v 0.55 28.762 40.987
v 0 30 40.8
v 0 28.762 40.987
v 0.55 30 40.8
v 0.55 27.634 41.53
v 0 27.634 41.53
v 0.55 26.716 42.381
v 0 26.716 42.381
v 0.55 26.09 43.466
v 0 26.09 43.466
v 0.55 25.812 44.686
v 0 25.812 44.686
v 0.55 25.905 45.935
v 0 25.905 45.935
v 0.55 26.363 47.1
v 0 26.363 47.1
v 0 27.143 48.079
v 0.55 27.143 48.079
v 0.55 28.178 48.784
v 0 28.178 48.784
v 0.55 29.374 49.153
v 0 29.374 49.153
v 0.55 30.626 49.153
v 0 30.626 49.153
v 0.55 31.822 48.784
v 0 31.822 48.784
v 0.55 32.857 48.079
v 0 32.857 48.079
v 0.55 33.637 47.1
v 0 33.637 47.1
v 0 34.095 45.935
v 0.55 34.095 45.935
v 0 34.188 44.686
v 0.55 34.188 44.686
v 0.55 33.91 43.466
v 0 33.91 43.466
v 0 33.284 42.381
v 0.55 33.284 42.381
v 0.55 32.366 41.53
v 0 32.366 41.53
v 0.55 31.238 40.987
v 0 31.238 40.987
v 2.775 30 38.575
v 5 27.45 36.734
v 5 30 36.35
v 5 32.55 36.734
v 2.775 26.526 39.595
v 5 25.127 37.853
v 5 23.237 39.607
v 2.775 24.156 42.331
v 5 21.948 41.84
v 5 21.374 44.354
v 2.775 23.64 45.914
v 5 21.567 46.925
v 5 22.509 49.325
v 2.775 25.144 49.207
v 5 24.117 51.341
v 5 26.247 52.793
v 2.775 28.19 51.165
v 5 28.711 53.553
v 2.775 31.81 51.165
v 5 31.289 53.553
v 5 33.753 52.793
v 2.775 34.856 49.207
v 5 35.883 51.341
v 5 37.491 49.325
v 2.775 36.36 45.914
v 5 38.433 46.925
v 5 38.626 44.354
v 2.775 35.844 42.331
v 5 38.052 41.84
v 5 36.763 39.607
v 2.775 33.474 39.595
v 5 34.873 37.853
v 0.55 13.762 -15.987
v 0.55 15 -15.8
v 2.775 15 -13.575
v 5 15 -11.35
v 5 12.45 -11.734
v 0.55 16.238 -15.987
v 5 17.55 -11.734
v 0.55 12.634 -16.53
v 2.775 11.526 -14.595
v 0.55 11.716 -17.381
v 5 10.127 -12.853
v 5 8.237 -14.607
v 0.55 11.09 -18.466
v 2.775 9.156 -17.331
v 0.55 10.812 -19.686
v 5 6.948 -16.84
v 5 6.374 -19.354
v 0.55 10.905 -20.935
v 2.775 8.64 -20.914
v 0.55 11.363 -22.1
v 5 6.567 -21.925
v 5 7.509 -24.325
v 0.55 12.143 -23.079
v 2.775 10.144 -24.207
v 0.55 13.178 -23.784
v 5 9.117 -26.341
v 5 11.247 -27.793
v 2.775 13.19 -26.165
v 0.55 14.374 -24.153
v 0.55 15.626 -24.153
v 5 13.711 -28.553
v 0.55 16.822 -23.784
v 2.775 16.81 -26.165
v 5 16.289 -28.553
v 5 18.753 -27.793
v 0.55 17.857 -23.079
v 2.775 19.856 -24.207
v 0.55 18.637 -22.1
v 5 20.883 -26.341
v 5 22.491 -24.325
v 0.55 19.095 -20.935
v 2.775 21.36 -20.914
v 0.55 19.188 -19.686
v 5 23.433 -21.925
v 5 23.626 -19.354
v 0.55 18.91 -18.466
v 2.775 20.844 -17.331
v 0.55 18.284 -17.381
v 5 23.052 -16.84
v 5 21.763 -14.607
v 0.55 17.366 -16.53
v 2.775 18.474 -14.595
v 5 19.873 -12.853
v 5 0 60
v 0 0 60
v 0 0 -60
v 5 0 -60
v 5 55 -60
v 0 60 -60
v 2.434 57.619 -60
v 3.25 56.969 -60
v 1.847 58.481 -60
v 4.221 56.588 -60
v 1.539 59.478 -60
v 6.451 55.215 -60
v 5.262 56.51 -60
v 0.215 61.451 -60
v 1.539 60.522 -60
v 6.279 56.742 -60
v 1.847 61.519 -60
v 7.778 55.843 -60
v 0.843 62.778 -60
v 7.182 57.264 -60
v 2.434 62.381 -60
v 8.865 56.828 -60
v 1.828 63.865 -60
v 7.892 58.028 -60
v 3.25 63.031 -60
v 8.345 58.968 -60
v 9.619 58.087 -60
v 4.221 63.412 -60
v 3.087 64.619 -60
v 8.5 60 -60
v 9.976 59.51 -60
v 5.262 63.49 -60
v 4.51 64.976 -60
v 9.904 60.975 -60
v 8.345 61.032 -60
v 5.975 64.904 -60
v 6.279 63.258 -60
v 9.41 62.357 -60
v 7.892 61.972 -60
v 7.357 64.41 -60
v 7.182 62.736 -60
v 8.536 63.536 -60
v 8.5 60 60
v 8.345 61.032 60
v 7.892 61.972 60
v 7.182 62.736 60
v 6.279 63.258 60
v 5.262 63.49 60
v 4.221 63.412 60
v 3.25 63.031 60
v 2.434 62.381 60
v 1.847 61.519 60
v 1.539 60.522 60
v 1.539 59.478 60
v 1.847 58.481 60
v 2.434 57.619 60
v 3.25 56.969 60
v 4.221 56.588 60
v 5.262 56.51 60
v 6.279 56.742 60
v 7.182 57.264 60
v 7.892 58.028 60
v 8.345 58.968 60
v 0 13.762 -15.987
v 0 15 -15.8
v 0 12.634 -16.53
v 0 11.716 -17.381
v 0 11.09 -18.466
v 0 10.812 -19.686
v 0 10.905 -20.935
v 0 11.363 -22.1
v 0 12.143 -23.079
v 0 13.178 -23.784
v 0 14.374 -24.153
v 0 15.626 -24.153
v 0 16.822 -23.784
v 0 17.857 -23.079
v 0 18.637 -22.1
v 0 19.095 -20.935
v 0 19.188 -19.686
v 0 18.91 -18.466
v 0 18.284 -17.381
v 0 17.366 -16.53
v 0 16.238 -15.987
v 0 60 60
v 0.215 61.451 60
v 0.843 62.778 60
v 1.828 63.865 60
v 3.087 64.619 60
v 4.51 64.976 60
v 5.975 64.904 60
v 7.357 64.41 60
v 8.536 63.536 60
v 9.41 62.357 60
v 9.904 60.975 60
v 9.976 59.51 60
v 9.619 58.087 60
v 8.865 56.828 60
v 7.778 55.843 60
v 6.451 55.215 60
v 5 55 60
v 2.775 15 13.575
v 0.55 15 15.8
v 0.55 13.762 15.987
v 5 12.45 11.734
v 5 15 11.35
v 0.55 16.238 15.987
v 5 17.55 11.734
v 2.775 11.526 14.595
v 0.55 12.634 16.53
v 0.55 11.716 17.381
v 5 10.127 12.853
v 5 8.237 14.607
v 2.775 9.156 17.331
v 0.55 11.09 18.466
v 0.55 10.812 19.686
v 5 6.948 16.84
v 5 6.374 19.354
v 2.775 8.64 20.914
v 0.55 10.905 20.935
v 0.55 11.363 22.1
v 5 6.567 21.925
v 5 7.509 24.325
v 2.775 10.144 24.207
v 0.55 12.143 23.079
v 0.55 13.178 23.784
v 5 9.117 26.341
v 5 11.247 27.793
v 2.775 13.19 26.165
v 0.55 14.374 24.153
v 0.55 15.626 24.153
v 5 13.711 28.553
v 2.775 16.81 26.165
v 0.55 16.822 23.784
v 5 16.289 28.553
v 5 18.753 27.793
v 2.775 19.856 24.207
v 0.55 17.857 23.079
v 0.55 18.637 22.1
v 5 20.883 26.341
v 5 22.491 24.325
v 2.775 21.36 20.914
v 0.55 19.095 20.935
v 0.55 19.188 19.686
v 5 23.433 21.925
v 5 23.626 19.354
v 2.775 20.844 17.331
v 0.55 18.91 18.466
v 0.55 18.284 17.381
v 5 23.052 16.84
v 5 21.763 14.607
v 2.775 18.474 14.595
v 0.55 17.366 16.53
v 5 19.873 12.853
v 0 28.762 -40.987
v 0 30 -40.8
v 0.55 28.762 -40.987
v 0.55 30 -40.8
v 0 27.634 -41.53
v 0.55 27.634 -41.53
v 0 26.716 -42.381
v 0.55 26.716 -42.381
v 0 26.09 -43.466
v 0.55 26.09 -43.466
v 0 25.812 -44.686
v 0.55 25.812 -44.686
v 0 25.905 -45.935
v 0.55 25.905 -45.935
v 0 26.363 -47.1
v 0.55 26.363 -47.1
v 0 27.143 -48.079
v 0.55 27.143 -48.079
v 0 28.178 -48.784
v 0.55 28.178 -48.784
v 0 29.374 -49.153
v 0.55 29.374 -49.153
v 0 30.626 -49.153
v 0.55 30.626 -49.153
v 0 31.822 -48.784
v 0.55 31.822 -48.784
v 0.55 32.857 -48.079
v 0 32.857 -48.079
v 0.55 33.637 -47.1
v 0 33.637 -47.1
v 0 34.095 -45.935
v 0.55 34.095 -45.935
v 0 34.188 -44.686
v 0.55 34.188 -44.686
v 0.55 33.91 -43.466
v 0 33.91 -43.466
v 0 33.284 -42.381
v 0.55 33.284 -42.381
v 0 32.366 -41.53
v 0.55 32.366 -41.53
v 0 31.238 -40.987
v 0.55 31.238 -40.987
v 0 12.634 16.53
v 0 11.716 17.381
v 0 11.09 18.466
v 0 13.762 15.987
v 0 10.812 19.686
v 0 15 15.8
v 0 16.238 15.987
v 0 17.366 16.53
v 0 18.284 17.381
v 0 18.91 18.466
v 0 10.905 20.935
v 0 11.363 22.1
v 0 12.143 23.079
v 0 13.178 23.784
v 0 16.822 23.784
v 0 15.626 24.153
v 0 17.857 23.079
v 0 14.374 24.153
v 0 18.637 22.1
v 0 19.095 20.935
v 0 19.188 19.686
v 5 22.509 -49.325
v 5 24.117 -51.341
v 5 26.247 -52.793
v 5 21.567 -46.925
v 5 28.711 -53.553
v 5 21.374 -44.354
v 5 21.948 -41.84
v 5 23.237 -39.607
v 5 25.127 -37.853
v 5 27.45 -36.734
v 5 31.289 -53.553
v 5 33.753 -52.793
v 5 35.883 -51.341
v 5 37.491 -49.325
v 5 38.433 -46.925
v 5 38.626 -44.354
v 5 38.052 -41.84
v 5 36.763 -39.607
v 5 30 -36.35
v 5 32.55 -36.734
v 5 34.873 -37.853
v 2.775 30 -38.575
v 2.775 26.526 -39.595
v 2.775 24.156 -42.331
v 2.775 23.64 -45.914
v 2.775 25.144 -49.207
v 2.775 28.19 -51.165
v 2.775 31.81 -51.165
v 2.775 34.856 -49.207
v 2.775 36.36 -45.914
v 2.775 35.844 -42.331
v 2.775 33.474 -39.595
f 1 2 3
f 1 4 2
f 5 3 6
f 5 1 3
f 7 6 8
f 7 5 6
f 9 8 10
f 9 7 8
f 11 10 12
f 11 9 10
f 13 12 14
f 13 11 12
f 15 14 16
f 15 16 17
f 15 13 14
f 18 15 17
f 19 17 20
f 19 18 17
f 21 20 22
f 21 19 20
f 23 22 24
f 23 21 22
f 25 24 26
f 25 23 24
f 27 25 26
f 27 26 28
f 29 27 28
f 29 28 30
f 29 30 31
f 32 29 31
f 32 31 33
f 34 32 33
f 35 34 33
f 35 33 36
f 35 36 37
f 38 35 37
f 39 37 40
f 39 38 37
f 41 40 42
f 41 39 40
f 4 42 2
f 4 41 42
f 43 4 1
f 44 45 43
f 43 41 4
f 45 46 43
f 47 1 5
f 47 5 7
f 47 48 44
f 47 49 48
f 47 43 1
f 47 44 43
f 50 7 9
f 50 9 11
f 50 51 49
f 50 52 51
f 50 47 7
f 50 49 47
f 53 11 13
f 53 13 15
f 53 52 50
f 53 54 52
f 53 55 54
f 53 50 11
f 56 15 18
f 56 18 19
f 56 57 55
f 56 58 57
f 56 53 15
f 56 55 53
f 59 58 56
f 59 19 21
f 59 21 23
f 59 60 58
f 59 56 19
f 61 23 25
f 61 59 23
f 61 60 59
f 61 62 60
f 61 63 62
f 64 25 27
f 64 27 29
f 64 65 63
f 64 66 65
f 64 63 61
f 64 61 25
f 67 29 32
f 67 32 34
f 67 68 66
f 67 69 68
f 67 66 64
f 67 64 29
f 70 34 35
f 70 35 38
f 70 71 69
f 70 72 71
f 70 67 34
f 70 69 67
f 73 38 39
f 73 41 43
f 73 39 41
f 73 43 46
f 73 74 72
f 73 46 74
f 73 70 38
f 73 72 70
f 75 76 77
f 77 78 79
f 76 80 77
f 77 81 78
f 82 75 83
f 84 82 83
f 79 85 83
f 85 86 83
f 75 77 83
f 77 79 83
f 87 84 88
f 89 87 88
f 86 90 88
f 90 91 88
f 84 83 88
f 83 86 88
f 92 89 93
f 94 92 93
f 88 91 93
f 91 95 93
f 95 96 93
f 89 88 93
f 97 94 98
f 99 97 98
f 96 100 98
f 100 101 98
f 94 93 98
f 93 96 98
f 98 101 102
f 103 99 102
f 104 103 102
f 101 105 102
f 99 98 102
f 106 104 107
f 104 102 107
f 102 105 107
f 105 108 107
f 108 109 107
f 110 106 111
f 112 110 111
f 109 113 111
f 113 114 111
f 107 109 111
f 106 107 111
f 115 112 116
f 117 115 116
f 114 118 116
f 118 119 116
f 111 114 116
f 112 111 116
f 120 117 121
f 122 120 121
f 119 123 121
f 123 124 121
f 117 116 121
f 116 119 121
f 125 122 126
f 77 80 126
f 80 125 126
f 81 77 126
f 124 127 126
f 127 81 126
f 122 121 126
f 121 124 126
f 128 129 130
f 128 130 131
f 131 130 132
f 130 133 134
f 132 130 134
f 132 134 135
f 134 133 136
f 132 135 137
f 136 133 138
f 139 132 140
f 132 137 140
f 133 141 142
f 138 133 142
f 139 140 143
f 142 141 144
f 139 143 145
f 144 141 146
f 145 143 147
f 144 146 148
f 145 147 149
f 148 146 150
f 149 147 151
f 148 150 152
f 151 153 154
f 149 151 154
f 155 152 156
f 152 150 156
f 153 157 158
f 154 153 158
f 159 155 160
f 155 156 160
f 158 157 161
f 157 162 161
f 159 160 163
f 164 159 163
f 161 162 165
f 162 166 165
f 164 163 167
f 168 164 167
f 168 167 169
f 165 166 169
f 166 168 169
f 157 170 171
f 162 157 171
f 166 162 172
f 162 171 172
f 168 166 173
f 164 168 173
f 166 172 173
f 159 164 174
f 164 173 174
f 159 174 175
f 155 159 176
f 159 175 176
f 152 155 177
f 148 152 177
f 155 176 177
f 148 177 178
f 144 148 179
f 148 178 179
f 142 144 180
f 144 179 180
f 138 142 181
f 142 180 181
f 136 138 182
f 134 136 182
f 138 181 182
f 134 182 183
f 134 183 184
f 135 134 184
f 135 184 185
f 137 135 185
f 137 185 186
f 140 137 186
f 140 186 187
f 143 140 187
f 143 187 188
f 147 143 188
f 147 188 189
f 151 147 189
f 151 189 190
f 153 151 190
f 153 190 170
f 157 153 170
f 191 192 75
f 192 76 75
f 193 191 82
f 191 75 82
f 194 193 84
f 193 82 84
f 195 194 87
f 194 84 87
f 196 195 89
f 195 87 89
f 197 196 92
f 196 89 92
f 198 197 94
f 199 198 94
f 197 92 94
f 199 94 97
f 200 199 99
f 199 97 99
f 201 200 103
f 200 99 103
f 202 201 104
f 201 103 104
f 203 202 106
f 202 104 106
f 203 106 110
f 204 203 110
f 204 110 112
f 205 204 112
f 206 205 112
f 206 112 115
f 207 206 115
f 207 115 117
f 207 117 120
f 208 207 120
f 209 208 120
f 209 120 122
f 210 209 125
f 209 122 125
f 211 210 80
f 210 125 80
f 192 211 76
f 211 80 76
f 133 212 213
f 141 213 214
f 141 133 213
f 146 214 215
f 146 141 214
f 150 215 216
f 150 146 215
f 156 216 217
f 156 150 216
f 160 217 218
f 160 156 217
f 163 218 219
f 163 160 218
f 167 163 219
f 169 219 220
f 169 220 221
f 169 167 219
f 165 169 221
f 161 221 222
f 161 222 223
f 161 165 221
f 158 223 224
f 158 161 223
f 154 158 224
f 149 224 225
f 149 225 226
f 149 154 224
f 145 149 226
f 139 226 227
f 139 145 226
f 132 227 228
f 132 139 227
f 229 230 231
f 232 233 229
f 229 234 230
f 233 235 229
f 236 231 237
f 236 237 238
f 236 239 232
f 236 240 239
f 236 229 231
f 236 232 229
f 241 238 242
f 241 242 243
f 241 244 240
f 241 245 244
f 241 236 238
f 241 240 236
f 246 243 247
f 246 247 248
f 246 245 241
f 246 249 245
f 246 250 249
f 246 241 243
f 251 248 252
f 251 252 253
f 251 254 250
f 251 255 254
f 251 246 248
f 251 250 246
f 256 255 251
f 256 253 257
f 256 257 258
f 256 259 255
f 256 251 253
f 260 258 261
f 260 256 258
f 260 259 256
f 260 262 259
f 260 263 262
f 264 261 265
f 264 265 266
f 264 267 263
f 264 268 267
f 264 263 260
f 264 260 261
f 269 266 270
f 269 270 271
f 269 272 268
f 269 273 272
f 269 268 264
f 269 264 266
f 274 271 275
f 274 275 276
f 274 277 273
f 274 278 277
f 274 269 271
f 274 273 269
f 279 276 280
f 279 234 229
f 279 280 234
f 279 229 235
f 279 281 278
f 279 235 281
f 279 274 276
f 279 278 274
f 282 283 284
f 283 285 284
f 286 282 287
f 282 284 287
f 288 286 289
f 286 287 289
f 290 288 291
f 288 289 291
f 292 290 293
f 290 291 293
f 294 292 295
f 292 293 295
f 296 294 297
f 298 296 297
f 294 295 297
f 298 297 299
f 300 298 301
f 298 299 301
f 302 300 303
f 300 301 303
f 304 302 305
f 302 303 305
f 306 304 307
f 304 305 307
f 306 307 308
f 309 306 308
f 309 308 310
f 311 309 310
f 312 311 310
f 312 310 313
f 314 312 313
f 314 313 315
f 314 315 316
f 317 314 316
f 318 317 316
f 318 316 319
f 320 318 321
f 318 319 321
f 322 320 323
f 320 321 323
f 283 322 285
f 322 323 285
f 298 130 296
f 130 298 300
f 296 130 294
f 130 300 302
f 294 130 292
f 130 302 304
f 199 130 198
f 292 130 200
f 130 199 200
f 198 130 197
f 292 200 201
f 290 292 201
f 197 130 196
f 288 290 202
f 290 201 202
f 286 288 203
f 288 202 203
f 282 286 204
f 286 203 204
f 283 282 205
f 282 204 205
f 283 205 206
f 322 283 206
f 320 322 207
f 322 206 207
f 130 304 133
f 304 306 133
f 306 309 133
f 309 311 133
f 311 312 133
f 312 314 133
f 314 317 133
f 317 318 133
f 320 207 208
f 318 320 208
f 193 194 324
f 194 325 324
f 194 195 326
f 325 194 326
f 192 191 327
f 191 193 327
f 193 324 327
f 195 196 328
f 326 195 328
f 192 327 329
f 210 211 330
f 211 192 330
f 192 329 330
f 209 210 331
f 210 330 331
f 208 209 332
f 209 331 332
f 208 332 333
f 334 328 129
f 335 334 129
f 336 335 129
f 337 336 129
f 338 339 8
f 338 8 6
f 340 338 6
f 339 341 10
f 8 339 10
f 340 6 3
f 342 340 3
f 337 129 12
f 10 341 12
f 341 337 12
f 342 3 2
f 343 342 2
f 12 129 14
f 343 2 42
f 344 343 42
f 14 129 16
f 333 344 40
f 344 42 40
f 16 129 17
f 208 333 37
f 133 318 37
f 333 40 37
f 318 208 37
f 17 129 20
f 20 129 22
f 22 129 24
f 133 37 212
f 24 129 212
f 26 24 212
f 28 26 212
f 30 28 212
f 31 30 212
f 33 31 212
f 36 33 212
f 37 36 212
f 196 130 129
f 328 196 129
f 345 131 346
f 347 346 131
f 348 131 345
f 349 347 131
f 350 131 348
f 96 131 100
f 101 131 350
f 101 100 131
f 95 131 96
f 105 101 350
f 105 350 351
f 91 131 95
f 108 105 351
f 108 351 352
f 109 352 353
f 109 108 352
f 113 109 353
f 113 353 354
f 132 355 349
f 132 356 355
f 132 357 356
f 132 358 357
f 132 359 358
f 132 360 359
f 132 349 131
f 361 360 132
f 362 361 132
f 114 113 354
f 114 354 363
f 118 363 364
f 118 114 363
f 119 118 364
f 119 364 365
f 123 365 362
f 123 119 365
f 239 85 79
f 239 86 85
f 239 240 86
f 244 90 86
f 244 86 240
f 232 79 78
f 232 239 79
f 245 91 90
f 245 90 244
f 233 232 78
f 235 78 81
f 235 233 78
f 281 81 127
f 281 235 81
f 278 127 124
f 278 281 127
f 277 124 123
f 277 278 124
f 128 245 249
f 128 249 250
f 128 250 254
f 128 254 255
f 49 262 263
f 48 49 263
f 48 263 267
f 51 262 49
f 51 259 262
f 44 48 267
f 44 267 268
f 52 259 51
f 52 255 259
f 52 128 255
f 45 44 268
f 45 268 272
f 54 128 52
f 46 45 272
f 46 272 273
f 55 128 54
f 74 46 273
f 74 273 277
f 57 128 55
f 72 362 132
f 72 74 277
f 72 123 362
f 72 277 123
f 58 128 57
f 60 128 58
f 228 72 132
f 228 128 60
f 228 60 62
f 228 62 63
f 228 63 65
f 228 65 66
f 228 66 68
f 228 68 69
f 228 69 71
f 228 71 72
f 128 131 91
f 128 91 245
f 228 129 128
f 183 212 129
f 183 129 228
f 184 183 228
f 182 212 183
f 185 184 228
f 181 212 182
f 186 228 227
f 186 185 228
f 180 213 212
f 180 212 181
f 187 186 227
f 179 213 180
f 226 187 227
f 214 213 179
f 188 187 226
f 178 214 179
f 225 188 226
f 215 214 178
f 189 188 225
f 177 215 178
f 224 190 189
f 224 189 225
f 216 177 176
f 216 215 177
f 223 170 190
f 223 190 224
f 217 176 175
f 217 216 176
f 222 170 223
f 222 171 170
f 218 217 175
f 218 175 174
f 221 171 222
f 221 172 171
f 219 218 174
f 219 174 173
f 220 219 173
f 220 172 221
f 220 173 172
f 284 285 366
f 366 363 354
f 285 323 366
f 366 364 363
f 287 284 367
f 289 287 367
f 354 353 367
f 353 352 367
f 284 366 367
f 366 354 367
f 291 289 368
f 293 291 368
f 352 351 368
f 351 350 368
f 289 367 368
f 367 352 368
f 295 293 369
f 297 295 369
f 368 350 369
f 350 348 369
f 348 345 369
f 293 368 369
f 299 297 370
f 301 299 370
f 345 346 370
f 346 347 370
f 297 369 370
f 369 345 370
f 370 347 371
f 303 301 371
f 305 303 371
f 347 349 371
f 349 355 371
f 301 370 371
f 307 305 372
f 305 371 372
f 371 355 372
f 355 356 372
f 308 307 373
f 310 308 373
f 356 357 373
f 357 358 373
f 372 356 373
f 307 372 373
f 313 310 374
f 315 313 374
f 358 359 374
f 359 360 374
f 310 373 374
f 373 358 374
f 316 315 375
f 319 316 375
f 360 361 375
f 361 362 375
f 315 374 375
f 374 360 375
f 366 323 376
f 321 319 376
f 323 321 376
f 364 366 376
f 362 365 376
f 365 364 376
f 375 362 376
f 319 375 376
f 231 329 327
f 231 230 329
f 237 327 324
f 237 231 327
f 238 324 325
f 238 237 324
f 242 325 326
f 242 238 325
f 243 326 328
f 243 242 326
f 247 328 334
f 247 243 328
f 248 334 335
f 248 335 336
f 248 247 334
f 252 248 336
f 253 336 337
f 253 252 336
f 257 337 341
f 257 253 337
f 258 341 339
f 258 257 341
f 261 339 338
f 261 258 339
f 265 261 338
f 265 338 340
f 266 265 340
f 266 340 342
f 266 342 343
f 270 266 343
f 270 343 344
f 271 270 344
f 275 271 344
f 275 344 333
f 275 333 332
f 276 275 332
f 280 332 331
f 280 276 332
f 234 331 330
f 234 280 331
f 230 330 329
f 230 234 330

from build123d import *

# Parameters (mm, degrees)
SKETCH2_W                                      = 5
SKETCH2_H                                      = 60
EXTRUDE_THIN1_DEPTH                            = 60
SKETCH3_R                                      = 5
SKETCH4_R                                      = 3.5
CUT_EXTRUDE1_DEPTH                             = 137.839321834
CSK_FOR_M8_FLAT_HEAD_MACHINE_SCREW1_AT_2_COUNT = 2
CSK_FOR_M8_FLAT_HEAD_MACHINE_SCREW1_AT_2_PITCH = 29.154759474


with BuildPart() as part:
    # Sketch2 → Extrude-Thin1 (new, symmetric)
    with BuildSketch(Plane.XY):
        with Locations((2.5, 30)):
            Rectangle(SKETCH2_W, SKETCH2_H)
    extrude(amount=EXTRUDE_THIN1_DEPTH, both=True)

    # Sweep1: sweep along a curve in space
    with BuildLine() as sweep1_path:
        Line((5, 60, 60), (5, 60, -60))
    # Sketch3 → Sweep1 (sweep)
    with BuildSketch(Plane.XY.offset(60)):
        with Locations((5, 60)):
            Circle(SKETCH3_R)
    sweep(path=sweep1_path.line)

    # Sketch4 → Cut-Extrude1 (cut, through all)
    with BuildSketch(Plane.XY.offset(60)):
        with Locations((5, 60)):
            Circle(SKETCH4_R)
    extrude(amount=-CUT_EXTRUDE1_DEPTH, mode=Mode.SUBTRACT)

    # Sketch6 → CSK for M8 Flat Head Machine Screw1 (revolve, cut)
    with BuildSketch(Plane(origin=(5, 15, 20), x_dir=(0, 0, -1), z_dir=(0, 1, 0))):
        Polygon((0, 0), (0, 5), (4.2, 5), (4.2, 4.45), (8.65, 0), align=None)
    csk_for_m8_flat_head_machine_screw1 = revolve(axis=Axis((11.35, 15, 20), (-1, 0, 0)), mode=Mode.SUBTRACT)

    # CSK for M8 Flat Head Machine Screw1 at 2: CSK for M8 Flat Head Machine Screw1 ×2
    with Locations(*[Vector(0, 0.5144957554275265, 0.8574929257125442) * (i * CSK_FOR_M8_FLAT_HEAD_MACHINE_SCREW1_AT_2_PITCH) for i in range(1, CSK_FOR_M8_FLAT_HEAD_MACHINE_SCREW1_AT_2_COUNT)]):
        add(csk_for_m8_flat_head_machine_screw1, mode=Mode.SUBTRACT)

    # Mirror1: CSK for M8 Flat Head Machine Screw1 across plane
    add(csk_for_m8_flat_head_machine_screw1.mirror(Plane.XY), mode=Mode.SUBTRACT)

    # Mirror1 copy 1 sketch → Mirror1 copy 1 (revolve, cut)
    with BuildSketch(Plane(origin=(5, 30, -45), x_dir=(0, 0, 1), z_dir=(0, 1, 0))):
        Polygon((0, 0), (0, -5), (4.2, -5), (4.2, -4.45), (8.65, 0), align=None)
    revolve(axis=Axis((11.35, 30, -45), (1, 0, 0)), mode=Mode.SUBTRACT)


solid = part.part
